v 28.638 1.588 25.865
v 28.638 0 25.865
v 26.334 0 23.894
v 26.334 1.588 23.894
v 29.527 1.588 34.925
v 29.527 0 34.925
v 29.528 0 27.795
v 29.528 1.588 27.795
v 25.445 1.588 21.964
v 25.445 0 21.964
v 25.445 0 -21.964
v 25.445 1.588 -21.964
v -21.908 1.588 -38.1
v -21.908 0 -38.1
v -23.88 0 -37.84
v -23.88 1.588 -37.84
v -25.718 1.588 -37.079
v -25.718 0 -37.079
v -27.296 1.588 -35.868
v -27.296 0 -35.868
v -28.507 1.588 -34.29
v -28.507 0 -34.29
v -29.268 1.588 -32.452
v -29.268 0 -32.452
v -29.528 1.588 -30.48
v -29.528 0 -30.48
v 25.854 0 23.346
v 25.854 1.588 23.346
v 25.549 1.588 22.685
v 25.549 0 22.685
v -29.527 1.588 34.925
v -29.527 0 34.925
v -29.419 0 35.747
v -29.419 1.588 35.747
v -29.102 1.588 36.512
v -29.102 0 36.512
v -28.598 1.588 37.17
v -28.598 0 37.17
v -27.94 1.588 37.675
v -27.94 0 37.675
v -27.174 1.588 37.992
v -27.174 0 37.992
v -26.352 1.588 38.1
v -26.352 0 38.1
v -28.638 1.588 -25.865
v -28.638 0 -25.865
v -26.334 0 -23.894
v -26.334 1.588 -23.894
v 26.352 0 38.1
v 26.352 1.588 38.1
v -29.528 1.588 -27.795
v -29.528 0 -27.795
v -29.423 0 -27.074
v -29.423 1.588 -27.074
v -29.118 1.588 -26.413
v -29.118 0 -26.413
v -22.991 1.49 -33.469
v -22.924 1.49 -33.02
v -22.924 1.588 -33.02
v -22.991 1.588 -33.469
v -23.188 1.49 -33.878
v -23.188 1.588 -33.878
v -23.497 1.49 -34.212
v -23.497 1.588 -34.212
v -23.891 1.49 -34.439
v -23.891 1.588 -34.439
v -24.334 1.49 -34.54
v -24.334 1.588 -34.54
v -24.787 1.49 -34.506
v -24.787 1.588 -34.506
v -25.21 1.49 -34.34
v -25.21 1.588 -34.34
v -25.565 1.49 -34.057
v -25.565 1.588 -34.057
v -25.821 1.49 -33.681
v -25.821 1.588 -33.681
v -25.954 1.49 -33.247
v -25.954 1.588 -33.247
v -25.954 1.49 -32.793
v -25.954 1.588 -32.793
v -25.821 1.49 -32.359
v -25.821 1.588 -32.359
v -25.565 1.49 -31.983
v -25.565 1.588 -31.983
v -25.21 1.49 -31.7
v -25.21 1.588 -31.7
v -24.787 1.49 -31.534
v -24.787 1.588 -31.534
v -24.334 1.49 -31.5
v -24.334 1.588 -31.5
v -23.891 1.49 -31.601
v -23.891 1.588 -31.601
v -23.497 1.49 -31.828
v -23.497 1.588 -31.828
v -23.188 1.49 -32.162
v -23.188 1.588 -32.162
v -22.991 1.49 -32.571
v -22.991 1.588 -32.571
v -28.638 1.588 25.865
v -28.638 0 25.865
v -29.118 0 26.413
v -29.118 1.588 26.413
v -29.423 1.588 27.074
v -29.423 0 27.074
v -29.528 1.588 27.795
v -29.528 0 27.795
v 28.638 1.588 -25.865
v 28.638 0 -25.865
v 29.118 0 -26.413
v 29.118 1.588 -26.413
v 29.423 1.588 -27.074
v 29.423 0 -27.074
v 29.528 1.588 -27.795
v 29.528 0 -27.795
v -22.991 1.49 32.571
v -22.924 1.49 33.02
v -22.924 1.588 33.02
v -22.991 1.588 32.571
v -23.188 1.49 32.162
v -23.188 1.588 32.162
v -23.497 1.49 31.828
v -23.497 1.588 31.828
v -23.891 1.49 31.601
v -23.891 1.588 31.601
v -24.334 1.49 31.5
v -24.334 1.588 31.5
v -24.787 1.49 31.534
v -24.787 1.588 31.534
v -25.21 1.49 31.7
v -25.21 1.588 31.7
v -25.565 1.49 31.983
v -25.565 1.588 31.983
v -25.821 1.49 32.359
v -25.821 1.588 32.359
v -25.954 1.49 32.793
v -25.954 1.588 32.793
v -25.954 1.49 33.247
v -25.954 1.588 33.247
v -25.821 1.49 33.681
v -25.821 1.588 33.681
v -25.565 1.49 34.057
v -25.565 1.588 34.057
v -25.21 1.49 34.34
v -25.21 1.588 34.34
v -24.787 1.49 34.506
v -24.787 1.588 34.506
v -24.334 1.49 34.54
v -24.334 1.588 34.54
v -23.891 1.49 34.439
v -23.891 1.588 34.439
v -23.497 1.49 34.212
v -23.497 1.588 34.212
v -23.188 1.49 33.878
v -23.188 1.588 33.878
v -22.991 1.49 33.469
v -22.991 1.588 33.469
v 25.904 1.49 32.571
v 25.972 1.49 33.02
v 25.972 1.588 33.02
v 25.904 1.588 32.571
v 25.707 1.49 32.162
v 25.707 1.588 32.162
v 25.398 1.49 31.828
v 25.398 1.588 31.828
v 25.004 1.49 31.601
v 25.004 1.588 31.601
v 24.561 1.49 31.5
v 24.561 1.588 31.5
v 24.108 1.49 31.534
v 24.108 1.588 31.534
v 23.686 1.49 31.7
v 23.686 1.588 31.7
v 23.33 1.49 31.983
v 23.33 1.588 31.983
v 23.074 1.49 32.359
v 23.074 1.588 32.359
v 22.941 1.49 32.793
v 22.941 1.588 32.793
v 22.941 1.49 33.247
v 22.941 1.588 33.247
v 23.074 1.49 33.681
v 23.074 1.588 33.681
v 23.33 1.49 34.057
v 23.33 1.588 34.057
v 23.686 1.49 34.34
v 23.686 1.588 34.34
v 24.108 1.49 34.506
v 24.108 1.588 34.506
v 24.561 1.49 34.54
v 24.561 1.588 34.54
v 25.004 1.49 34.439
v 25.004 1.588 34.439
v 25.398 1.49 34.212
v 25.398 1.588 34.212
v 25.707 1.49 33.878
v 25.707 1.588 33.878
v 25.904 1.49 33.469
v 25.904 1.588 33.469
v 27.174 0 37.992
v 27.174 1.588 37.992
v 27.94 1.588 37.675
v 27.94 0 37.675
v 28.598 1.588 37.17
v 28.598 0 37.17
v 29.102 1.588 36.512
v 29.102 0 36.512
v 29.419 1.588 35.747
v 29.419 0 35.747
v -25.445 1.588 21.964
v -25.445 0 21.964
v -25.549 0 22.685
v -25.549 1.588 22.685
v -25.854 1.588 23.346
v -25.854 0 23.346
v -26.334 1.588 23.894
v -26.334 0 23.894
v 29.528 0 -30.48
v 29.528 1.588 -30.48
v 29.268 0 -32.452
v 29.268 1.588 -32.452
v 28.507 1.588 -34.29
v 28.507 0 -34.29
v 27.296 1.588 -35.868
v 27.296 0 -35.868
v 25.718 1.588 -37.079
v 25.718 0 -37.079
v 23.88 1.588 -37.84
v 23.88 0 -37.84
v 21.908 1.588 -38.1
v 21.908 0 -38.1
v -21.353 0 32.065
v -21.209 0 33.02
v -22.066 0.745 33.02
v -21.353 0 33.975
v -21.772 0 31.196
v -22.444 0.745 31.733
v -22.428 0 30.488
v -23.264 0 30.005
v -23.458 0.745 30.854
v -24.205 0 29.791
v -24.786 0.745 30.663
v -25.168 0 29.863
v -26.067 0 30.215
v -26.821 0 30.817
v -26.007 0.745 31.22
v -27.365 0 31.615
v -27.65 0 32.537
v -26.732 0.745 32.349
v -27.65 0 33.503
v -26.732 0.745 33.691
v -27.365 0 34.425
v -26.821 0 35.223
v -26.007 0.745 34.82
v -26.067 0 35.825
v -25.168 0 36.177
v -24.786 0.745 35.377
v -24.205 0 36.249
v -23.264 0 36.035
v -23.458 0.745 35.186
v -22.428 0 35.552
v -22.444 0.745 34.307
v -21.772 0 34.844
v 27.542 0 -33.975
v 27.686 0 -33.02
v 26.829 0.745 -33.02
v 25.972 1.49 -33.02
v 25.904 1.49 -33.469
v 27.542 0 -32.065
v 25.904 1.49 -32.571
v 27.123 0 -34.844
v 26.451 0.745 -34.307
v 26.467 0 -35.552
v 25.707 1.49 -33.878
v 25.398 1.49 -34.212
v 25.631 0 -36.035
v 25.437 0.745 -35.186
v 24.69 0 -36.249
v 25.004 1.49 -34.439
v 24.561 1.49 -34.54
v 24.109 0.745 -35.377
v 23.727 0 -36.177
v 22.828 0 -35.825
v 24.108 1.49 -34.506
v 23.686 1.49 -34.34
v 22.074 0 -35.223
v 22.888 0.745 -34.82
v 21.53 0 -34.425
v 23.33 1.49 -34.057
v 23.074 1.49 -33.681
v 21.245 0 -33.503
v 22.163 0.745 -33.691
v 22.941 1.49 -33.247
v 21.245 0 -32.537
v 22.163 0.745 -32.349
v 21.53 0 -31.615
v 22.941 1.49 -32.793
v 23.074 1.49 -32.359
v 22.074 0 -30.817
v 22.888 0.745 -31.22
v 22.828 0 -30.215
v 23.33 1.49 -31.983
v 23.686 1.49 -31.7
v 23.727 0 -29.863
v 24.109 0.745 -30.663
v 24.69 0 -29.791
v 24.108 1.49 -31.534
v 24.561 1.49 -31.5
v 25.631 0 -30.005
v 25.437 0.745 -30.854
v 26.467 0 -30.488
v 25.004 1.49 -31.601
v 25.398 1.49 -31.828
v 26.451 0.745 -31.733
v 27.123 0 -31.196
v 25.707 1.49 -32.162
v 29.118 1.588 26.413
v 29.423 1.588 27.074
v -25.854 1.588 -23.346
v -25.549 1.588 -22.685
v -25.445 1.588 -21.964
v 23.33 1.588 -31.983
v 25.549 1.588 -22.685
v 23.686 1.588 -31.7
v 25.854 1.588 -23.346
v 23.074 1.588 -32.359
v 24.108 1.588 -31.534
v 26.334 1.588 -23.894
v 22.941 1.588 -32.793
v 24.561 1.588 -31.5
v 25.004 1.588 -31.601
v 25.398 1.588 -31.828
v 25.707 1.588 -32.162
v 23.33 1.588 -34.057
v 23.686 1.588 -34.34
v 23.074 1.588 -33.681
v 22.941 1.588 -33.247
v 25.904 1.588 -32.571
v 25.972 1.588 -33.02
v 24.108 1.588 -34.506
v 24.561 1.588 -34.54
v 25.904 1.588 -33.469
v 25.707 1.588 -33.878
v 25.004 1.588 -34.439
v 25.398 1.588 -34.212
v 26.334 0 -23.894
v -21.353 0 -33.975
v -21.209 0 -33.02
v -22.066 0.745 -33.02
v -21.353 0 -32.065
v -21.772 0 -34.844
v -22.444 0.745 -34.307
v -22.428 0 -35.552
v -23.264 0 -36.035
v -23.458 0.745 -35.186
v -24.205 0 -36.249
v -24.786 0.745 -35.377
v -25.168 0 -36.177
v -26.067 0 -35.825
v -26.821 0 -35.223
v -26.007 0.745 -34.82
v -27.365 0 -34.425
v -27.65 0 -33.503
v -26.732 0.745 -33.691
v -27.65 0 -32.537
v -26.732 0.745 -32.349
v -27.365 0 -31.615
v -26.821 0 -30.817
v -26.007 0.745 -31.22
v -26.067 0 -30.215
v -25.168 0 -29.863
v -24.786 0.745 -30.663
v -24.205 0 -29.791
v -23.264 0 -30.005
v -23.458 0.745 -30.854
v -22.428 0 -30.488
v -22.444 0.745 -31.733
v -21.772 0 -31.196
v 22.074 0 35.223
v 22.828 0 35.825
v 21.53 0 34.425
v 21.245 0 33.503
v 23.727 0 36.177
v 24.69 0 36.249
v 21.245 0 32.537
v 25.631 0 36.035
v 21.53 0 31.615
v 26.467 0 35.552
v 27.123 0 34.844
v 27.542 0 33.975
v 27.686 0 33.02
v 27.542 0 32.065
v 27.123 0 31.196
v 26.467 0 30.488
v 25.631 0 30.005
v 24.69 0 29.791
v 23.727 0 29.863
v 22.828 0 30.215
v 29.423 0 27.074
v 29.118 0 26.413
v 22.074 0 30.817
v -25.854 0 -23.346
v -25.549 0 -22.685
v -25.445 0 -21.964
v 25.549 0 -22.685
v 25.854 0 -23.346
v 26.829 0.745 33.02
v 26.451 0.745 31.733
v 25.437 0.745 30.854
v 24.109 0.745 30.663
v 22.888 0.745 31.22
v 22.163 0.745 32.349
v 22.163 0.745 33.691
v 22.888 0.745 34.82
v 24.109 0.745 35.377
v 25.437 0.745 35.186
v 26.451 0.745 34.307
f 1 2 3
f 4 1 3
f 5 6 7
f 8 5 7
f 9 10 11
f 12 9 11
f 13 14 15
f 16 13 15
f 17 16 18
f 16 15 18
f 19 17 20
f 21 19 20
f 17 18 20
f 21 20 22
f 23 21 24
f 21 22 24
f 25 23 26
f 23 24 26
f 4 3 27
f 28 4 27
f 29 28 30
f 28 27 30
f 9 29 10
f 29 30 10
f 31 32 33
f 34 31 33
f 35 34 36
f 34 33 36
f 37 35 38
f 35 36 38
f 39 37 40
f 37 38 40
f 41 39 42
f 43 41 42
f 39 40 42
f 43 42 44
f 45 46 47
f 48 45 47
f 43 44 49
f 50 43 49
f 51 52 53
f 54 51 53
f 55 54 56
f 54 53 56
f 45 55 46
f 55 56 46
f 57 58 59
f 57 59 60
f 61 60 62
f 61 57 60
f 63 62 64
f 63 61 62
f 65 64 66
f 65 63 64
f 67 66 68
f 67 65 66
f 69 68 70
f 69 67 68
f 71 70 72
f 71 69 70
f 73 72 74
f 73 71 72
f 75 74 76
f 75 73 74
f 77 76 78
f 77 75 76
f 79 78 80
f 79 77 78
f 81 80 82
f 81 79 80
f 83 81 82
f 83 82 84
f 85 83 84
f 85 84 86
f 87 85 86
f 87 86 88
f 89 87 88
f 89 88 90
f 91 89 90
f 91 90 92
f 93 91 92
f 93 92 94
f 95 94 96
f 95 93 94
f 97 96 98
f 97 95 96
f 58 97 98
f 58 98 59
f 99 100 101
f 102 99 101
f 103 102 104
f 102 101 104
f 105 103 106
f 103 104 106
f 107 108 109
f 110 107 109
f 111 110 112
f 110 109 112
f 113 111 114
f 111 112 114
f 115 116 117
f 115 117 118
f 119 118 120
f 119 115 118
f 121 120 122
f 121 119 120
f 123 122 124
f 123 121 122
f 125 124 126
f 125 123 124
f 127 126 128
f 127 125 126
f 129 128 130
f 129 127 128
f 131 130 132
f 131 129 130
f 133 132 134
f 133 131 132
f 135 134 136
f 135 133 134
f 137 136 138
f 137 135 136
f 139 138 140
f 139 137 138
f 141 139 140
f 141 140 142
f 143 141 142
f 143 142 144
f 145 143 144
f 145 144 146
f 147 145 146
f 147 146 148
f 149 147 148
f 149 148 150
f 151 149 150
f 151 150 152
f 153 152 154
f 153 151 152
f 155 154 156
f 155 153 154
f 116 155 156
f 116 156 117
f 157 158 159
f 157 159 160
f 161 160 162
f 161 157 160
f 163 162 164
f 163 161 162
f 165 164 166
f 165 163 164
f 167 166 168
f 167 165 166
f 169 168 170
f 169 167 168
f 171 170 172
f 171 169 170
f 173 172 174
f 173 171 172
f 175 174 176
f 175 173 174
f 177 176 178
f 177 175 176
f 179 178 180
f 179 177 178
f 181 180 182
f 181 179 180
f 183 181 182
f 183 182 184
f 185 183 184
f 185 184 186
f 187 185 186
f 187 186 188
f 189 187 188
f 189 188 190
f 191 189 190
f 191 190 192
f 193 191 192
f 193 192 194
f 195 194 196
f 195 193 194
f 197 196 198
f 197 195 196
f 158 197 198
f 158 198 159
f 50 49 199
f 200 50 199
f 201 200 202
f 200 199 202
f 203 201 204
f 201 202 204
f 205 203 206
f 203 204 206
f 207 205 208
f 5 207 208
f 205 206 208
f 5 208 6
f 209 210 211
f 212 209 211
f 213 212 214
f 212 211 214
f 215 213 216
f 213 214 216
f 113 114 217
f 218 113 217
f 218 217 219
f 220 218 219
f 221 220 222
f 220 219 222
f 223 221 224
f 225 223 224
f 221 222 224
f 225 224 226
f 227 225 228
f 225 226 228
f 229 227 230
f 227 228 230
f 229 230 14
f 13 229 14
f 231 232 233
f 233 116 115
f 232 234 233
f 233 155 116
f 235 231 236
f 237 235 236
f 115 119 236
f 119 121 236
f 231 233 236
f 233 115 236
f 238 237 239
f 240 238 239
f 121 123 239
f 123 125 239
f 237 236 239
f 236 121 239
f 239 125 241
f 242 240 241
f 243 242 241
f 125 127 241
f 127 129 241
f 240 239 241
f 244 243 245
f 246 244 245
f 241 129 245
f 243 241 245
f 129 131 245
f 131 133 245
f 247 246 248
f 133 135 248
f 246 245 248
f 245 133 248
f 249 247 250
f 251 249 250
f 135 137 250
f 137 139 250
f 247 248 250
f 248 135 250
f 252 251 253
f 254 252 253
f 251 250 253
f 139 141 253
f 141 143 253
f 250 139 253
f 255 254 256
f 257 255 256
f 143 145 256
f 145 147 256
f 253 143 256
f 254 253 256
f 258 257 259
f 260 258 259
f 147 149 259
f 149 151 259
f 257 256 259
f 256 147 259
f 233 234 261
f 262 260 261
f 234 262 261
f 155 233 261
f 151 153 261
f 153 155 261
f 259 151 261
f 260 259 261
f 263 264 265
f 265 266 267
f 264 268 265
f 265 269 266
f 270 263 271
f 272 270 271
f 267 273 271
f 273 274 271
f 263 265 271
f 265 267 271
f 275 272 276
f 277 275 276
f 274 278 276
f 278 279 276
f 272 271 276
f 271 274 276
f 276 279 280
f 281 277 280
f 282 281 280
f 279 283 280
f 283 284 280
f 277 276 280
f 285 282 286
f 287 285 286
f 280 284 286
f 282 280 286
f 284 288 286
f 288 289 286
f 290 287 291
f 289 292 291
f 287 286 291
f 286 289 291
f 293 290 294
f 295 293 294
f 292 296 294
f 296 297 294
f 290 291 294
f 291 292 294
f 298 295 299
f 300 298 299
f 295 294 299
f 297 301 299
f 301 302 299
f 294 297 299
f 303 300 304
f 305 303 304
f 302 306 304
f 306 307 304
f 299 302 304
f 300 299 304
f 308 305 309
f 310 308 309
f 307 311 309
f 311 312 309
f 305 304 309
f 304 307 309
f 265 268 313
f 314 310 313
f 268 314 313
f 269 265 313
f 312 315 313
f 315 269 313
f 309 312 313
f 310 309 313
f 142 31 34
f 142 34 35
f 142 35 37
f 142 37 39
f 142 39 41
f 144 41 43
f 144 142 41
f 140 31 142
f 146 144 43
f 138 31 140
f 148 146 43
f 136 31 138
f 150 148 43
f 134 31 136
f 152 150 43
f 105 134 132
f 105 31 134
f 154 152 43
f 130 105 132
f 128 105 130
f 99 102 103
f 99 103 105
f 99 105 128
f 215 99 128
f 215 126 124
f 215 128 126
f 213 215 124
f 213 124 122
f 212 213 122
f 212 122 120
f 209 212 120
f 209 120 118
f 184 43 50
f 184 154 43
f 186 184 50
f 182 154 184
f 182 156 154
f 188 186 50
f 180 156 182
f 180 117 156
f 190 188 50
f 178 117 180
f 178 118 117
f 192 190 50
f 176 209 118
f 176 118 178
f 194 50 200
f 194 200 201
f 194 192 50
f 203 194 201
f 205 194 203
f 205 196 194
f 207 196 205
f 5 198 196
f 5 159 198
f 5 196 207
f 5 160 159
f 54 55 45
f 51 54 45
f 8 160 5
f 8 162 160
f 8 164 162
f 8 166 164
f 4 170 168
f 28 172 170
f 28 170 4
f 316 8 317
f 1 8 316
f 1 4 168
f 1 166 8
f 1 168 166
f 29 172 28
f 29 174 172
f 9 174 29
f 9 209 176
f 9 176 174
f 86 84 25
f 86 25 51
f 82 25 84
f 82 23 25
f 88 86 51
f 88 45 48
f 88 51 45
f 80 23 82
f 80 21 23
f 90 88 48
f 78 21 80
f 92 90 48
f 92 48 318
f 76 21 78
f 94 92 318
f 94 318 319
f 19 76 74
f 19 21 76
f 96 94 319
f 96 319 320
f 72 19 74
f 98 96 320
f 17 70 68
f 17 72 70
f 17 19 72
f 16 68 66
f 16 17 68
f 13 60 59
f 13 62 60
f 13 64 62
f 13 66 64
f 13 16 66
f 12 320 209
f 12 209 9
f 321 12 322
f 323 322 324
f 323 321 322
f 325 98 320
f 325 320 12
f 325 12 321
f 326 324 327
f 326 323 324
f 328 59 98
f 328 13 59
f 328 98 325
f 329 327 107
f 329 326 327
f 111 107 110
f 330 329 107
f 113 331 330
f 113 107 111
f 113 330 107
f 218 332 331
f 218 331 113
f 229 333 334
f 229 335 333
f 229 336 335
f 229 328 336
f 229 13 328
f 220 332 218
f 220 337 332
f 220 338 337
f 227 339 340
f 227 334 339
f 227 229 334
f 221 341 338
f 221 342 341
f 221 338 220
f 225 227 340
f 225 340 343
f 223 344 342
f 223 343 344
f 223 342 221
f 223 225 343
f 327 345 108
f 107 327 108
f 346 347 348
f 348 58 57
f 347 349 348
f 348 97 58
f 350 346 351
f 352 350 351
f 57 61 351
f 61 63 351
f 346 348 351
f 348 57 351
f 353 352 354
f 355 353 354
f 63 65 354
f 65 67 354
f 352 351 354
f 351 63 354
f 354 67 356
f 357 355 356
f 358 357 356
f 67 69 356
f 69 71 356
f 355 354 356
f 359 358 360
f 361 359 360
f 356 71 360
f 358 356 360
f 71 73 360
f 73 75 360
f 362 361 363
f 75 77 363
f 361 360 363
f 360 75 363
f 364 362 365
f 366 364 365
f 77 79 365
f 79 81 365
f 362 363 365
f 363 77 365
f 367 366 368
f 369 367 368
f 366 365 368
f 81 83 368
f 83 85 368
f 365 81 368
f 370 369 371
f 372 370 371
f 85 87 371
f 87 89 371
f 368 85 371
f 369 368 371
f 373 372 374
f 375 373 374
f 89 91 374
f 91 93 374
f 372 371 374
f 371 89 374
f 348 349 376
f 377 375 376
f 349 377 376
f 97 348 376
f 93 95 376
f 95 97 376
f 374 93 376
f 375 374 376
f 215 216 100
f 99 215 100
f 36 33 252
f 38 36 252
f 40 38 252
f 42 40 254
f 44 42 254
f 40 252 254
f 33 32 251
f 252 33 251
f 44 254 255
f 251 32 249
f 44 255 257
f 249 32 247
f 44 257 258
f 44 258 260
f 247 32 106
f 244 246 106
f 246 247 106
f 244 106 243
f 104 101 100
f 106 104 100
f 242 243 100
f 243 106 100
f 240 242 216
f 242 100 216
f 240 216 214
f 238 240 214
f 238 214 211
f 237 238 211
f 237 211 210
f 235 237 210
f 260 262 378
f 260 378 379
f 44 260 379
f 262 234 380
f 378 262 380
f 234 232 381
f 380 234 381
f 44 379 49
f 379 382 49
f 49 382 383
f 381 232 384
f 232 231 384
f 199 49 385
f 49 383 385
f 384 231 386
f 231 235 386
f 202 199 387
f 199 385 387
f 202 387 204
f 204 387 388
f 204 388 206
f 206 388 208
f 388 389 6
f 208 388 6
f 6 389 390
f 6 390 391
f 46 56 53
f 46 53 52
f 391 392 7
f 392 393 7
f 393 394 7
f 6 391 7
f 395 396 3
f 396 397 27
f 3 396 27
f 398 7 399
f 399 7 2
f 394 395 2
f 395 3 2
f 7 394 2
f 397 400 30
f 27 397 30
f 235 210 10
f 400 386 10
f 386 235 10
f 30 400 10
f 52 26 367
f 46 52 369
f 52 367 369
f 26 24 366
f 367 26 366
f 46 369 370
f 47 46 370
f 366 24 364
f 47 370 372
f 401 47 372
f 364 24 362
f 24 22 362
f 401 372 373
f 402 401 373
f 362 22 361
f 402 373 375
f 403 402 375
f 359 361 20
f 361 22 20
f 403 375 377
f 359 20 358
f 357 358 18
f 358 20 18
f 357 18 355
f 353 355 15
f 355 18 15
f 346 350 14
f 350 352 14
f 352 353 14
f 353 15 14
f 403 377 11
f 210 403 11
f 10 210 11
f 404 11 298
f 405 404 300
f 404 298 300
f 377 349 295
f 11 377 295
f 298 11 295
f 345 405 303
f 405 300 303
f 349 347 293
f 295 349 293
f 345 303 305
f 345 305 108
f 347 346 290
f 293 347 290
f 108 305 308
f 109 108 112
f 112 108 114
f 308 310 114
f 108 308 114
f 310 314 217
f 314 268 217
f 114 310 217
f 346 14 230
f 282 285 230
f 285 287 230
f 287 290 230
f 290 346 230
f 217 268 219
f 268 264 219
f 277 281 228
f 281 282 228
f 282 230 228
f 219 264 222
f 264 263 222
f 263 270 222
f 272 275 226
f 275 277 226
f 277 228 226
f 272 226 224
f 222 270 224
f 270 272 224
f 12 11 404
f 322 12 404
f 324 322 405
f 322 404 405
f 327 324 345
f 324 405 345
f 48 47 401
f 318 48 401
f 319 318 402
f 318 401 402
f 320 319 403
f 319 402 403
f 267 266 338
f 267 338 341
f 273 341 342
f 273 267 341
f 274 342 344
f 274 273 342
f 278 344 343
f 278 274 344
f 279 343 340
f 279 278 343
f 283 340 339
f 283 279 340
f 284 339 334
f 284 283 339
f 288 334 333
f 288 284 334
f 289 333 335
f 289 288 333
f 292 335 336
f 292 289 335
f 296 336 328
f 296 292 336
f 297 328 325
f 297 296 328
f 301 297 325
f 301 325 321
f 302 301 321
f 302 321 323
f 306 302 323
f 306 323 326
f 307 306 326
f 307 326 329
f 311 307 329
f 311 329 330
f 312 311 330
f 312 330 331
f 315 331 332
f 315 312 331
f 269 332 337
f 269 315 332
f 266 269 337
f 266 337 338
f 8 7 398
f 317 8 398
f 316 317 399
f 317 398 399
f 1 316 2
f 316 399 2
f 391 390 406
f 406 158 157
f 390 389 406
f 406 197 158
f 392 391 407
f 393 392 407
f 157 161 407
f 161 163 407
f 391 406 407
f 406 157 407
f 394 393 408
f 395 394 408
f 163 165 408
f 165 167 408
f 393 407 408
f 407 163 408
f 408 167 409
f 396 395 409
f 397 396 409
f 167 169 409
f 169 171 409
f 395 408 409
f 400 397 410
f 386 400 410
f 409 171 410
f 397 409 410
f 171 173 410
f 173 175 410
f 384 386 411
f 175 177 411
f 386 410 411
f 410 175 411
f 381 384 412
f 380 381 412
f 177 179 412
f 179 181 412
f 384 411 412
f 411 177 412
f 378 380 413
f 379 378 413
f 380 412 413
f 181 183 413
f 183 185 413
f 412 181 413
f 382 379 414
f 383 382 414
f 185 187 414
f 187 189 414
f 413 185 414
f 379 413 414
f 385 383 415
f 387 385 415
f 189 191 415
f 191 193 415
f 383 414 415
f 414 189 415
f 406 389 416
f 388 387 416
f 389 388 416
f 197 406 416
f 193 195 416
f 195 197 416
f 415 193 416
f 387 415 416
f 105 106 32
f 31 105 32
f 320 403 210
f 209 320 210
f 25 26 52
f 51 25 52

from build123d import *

# Parameters (mm, degrees)
SKETCH1_R           = 1.524
BOSS_EXTRUDE1_DEPTH = 1.5875
CHAMFER1_SIZE       = 1.7145
CHAMFER1_SIZE2      = 1.490392112


with BuildPart() as part:
    # Sketch1 → Boss-Extrude1 (new body)
    with BuildSketch(Plane(origin=(0, 0, 0), x_dir=(1, 0, 0), z_dir=(0, 1, 0))):
        with BuildLine():
            Line((-26.3525, -38.1), (26.3525, -38.1))
            ThreePointArc((26.3525, -38.1), (28.59756403, -37.17006403), (29.5275, -34.925))
            Line((29.5275, -34.925), (29.5275, -27.795278791))
            ThreePointArc((29.5275, -27.795278791), (29.294536895, -26.732649616), (28.638381288, -25.864944371))
            Line((28.638381288, -25.864944371), (26.334171426, -23.89431332))
            ThreePointArc((26.334171426, -23.89431332), (25.678015818, -23.026608076), (25.445052714, -21.9639789))
            Line((25.445052714, -21.9639789), (25.445052714, 21.9639789))
            ThreePointArc((25.445052714, 21.9639789), (25.678015818, 23.026608076), (26.334171426, 23.89431332))
            Line((26.334171426, 23.89431332), (28.638381288, 25.864944371))
            ThreePointArc((28.638381288, 25.864944371), (29.294536895, 26.732649616), (29.5275, 27.795278791))
            Line((29.5275, 27.795278791), (29.5275, 30.48))
            ThreePointArc((29.5275, 30.48), (27.295653673, 35.868153673), (21.9075, 38.1))
            Line((21.9075, 38.1), (-21.9075, 38.1))
            ThreePointArc((-21.9075, 38.1), (-27.295653673, 35.868153673), (-29.5275, 30.48))
            Line((-29.5275, 30.48), (-29.5275, 27.795278791))
            ThreePointArc((-29.5275, 27.795278791), (-29.294536895, 26.732649616), (-28.638381288, 25.864944371))
            Line((-28.638381288, 25.864944371), (-26.334171426, 23.89431332))
            ThreePointArc((-26.334171426, 23.89431332), (-25.678015818, 23.026608076), (-25.445052714, 21.9639789))
            Line((-25.445052714, 21.9639789), (-25.445052714, -21.9639789))
            ThreePointArc((-25.445052714, -21.9639789), (-25.678015818, -23.026608076), (-26.334171426, -23.89431332))
            Line((-26.334171426, -23.89431332), (-28.638381288, -25.864944371))
            ThreePointArc((-28.638381288, -25.864944371), (-29.294536895, -26.732649616), (-29.5275, -27.795278791))
            Line((-29.5275, -27.795278791), (-29.5275, -34.925))
            ThreePointArc((-29.5275, -34.925), (-28.59756403, -37.17006403), (-26.3525, -38.1))
        make_face()
        with Locations((24.4475, 33.02)):
            Circle(SKETCH1_R, mode=Mode.SUBTRACT)
        with Locations((-24.4475, -33.02)):
            Circle(SKETCH1_R, mode=Mode.SUBTRACT)
        with Locations((-24.4475, 33.02)):
            Circle(SKETCH1_R, mode=Mode.SUBTRACT)
        with Locations((24.4475, -33.02)):
            Circle(SKETCH1_R, mode=Mode.SUBTRACT)
    extrude(amount=BOSS_EXTRUDE1_DEPTH)

    # Chamfer1
    chamfer1_edges = [part.edges().sort_by_distance(p)[0] for p in [
        (22.9235, 0, -33.02),
        (-25.9715, 0, 33.02),
        (-25.9715, 0, -33.02),
        (22.9235, 0, 33.02),
    ]]
    chamfer1_side = [part.faces().sort_by_distance(p)[0] for p in [
        (0, 0, 0.184699289),
    ]]
    chamfer(chamfer1_edges, length=CHAMFER1_SIZE, length2=CHAMFER1_SIZE2, reference=chamfer1_side[0])


solid = part.part
